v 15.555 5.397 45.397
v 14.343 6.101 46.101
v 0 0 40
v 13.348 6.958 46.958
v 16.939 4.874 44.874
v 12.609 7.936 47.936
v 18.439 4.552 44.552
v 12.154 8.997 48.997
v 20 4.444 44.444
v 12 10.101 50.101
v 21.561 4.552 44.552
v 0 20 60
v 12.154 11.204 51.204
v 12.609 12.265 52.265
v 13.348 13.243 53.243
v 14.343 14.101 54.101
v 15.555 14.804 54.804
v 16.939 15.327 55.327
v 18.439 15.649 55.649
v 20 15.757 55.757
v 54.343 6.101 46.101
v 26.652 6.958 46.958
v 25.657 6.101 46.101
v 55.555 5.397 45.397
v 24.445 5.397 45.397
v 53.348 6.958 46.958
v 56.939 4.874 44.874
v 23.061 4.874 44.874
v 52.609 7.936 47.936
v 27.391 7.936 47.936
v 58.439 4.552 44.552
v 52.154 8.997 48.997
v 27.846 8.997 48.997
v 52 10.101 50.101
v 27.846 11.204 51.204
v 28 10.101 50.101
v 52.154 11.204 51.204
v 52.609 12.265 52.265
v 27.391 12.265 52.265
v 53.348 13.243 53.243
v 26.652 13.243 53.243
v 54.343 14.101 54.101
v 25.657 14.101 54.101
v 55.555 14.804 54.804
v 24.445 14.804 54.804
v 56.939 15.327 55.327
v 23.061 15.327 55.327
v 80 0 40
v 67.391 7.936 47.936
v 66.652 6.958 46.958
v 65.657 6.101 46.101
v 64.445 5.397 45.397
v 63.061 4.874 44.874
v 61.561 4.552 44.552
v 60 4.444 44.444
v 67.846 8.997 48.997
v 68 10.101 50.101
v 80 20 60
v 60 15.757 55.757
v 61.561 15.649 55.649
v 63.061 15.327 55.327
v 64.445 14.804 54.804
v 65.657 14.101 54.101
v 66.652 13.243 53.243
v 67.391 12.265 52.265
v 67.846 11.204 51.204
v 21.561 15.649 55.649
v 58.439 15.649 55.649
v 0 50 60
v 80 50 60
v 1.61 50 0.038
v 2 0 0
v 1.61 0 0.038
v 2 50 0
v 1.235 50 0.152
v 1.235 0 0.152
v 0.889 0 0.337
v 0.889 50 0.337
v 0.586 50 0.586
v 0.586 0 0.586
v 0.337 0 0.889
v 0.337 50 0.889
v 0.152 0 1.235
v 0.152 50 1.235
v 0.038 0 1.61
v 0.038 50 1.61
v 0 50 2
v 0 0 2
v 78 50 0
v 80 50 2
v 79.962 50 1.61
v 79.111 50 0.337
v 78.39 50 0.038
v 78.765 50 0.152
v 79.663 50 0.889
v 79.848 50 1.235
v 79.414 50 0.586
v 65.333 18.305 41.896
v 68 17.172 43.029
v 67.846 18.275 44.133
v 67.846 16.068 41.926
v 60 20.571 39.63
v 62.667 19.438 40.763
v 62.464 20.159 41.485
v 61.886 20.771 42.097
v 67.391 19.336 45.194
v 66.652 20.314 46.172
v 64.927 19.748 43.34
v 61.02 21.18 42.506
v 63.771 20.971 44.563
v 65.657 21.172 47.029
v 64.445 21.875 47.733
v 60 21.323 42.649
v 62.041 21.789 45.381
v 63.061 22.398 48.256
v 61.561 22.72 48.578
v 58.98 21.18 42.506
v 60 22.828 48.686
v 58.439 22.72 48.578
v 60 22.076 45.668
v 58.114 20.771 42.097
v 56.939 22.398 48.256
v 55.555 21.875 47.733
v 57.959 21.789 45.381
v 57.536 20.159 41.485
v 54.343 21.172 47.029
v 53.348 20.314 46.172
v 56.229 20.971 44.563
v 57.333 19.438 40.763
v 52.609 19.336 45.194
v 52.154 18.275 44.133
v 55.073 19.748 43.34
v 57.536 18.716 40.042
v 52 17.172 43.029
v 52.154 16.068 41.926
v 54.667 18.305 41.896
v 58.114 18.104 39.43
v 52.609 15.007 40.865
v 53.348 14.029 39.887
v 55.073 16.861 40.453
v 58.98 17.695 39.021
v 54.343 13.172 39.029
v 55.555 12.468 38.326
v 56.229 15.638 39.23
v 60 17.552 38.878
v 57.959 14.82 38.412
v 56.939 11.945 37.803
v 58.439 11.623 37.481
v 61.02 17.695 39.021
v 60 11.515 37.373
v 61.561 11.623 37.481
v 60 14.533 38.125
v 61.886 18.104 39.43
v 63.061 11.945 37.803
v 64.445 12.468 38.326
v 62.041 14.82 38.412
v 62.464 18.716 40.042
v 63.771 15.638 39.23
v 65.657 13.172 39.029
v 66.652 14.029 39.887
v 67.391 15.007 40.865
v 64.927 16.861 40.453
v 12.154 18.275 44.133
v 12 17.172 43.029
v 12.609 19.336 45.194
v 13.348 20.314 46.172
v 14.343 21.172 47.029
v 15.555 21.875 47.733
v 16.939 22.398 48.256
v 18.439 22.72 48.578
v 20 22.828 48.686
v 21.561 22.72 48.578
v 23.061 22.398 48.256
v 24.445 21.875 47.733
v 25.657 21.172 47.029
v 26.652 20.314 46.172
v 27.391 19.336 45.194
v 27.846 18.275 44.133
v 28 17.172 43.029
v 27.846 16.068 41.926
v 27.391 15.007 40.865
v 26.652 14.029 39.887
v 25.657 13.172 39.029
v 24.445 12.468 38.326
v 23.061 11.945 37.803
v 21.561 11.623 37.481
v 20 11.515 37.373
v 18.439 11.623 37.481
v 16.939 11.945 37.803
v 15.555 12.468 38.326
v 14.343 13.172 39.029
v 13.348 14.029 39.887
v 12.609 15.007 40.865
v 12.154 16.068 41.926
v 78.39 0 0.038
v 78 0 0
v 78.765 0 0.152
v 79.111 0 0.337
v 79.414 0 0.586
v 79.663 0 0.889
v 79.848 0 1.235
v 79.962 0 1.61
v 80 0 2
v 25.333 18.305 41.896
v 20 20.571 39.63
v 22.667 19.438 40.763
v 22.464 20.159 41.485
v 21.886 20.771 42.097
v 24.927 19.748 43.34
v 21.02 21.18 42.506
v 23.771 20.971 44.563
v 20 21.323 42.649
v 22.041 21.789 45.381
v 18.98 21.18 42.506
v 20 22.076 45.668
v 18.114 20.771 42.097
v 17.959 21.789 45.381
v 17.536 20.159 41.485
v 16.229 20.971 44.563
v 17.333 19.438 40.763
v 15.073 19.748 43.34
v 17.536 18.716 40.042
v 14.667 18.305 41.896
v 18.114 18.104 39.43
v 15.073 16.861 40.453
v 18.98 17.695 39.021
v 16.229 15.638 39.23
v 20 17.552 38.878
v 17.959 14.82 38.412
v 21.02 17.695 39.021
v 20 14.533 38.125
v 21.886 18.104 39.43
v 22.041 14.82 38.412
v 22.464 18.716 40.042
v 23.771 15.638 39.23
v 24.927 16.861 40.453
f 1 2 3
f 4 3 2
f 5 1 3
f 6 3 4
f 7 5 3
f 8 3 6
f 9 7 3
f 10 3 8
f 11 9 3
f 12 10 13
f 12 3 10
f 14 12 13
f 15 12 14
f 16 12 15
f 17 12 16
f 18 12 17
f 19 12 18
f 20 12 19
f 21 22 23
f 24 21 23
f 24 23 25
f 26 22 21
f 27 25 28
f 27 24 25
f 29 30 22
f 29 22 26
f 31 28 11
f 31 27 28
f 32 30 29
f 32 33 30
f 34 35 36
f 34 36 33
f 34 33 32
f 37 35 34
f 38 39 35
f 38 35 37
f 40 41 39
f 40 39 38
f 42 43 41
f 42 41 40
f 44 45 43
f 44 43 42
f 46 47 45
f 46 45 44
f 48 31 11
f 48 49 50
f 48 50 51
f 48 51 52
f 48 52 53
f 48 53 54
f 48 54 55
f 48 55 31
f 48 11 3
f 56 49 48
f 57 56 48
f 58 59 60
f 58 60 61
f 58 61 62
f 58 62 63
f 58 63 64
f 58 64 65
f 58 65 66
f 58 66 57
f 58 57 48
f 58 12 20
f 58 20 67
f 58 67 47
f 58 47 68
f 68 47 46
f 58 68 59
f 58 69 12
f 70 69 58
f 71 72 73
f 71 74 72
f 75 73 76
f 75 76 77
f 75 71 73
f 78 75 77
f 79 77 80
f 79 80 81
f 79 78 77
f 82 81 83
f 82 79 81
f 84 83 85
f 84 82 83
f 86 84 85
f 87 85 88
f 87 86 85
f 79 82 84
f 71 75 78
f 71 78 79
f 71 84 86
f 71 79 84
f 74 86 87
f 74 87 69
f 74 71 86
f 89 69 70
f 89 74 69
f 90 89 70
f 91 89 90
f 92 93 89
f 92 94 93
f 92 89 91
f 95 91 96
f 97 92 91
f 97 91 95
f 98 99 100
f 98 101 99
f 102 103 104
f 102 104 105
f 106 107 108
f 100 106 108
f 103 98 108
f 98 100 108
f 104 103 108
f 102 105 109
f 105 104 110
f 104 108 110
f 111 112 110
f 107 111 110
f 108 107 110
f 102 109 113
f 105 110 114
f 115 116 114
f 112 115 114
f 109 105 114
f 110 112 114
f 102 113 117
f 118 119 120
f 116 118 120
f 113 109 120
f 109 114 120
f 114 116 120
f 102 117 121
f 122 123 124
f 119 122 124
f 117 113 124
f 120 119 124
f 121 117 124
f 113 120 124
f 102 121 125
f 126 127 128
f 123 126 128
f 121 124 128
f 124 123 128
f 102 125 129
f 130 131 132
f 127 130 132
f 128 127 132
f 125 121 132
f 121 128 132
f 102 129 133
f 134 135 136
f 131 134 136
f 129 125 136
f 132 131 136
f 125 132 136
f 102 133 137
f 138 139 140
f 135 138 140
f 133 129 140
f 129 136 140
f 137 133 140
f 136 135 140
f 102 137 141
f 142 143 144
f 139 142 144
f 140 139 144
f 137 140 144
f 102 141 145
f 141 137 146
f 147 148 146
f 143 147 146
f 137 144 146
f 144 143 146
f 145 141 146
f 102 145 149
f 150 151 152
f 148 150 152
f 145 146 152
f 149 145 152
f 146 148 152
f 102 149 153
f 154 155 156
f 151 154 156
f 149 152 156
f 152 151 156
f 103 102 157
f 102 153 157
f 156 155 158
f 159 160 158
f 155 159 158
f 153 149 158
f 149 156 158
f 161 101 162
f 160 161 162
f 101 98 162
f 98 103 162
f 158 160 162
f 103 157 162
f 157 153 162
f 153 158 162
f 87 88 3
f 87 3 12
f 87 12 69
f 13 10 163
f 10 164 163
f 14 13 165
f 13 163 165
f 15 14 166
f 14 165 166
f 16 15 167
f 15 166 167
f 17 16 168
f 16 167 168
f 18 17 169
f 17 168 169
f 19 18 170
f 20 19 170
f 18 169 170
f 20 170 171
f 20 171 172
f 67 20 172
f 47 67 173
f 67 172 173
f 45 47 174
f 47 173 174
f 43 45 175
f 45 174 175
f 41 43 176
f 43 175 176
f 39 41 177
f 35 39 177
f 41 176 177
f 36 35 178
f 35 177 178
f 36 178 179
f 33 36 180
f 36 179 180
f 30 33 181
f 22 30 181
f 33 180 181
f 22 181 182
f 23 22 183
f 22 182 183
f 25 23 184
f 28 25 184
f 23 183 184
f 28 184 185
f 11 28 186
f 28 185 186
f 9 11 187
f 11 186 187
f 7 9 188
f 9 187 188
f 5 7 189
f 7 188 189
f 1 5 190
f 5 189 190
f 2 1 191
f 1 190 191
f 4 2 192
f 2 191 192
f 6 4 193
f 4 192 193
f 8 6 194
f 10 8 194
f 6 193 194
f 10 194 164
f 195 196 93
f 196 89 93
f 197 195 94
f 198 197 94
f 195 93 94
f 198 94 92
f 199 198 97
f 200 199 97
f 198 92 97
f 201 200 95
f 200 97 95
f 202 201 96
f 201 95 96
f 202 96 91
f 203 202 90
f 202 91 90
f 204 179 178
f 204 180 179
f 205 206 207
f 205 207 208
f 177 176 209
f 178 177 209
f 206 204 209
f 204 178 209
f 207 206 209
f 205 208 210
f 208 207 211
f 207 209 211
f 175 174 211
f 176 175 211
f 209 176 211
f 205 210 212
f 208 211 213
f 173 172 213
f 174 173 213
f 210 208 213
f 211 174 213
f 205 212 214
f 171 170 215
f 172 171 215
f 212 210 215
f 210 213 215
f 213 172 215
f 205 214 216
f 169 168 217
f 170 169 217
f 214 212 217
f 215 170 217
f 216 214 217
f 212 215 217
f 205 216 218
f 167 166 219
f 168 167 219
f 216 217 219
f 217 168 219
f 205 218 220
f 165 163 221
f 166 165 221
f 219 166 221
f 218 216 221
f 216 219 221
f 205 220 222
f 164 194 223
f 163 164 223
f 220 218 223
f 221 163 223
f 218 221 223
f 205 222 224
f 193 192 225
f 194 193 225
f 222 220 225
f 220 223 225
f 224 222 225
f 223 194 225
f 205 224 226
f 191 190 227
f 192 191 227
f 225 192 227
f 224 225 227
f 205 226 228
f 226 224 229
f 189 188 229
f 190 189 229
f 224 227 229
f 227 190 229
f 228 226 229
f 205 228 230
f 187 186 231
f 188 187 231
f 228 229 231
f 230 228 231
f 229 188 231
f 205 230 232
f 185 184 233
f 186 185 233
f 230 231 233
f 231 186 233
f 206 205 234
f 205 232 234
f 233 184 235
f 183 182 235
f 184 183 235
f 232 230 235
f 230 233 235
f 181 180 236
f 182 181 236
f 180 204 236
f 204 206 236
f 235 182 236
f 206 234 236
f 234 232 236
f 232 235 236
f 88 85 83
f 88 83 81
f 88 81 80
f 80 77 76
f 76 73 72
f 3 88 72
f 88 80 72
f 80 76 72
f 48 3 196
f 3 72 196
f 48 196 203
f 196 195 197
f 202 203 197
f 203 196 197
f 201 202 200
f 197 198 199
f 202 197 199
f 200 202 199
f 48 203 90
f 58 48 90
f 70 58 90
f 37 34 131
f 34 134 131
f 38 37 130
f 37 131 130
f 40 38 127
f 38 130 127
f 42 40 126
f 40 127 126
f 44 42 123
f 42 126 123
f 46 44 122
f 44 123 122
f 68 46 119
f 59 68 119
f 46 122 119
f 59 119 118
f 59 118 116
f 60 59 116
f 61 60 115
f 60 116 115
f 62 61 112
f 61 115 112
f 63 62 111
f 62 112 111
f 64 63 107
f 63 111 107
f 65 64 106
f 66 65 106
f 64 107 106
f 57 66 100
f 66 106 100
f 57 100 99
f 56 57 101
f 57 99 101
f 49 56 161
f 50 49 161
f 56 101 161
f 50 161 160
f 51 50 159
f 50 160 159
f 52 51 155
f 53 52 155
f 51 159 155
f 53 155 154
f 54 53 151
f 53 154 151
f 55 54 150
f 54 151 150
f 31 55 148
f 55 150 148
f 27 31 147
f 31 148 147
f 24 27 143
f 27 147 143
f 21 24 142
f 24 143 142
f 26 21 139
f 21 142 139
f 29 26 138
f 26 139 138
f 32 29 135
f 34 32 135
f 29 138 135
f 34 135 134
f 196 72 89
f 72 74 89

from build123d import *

# Parameters (mm, degrees)
F0_W     = 80
F0_H     = 50
F1_DEPTH = 60
F2_SIZE  = 20
F4_D     = 16
F4_DEPTH = 10
F4_TIP   = 4.8068849522
F5_R     = 2
F6_R     = 2


with BuildPart() as f1:
    # F0 (on Top) → F1 (new body)
    with BuildSketch(Plane.XY):
        with Locations((40, 25)):
            Rectangle(F0_W, F0_H)
    extrude(amount=F1_DEPTH)

    # F2
    f2_edges = [f1.edges().sort_by_distance(p)[0] for p in [
        (40, 0, 60),
    ]]
    chamfer(f2_edges, length=F2_SIZE)

    # F4
    with Locations(Plane(origin=(0, -20, 20), x_dir=(1, 0, 0), z_dir=(0, -0.7071067812, 0.7071067812))):
        with Locations((20, 42.5685424949), (60, 42.5685424949)):
            Hole(F4_D / 2, depth=F4_DEPTH)
            with Locations((0, 0, -(F4_DEPTH + F4_TIP / 2))):  # 118° drill point
                Cone(0, F4_D / 2, F4_TIP, mode=Mode.SUBTRACT)

    # F5
    f5_edges = [f1.edges().sort_by_distance(p)[0] for p in [
        (80, 25, 0),
    ]]
    fillet(f5_edges, radius=F5_R)

    # F6
    f6_edges = [f1.edges().sort_by_distance(p)[0] for p in [
        (0, 25, 0),
    ]]
    fillet(f6_edges, radius=F6_R)


solid = f1.part
